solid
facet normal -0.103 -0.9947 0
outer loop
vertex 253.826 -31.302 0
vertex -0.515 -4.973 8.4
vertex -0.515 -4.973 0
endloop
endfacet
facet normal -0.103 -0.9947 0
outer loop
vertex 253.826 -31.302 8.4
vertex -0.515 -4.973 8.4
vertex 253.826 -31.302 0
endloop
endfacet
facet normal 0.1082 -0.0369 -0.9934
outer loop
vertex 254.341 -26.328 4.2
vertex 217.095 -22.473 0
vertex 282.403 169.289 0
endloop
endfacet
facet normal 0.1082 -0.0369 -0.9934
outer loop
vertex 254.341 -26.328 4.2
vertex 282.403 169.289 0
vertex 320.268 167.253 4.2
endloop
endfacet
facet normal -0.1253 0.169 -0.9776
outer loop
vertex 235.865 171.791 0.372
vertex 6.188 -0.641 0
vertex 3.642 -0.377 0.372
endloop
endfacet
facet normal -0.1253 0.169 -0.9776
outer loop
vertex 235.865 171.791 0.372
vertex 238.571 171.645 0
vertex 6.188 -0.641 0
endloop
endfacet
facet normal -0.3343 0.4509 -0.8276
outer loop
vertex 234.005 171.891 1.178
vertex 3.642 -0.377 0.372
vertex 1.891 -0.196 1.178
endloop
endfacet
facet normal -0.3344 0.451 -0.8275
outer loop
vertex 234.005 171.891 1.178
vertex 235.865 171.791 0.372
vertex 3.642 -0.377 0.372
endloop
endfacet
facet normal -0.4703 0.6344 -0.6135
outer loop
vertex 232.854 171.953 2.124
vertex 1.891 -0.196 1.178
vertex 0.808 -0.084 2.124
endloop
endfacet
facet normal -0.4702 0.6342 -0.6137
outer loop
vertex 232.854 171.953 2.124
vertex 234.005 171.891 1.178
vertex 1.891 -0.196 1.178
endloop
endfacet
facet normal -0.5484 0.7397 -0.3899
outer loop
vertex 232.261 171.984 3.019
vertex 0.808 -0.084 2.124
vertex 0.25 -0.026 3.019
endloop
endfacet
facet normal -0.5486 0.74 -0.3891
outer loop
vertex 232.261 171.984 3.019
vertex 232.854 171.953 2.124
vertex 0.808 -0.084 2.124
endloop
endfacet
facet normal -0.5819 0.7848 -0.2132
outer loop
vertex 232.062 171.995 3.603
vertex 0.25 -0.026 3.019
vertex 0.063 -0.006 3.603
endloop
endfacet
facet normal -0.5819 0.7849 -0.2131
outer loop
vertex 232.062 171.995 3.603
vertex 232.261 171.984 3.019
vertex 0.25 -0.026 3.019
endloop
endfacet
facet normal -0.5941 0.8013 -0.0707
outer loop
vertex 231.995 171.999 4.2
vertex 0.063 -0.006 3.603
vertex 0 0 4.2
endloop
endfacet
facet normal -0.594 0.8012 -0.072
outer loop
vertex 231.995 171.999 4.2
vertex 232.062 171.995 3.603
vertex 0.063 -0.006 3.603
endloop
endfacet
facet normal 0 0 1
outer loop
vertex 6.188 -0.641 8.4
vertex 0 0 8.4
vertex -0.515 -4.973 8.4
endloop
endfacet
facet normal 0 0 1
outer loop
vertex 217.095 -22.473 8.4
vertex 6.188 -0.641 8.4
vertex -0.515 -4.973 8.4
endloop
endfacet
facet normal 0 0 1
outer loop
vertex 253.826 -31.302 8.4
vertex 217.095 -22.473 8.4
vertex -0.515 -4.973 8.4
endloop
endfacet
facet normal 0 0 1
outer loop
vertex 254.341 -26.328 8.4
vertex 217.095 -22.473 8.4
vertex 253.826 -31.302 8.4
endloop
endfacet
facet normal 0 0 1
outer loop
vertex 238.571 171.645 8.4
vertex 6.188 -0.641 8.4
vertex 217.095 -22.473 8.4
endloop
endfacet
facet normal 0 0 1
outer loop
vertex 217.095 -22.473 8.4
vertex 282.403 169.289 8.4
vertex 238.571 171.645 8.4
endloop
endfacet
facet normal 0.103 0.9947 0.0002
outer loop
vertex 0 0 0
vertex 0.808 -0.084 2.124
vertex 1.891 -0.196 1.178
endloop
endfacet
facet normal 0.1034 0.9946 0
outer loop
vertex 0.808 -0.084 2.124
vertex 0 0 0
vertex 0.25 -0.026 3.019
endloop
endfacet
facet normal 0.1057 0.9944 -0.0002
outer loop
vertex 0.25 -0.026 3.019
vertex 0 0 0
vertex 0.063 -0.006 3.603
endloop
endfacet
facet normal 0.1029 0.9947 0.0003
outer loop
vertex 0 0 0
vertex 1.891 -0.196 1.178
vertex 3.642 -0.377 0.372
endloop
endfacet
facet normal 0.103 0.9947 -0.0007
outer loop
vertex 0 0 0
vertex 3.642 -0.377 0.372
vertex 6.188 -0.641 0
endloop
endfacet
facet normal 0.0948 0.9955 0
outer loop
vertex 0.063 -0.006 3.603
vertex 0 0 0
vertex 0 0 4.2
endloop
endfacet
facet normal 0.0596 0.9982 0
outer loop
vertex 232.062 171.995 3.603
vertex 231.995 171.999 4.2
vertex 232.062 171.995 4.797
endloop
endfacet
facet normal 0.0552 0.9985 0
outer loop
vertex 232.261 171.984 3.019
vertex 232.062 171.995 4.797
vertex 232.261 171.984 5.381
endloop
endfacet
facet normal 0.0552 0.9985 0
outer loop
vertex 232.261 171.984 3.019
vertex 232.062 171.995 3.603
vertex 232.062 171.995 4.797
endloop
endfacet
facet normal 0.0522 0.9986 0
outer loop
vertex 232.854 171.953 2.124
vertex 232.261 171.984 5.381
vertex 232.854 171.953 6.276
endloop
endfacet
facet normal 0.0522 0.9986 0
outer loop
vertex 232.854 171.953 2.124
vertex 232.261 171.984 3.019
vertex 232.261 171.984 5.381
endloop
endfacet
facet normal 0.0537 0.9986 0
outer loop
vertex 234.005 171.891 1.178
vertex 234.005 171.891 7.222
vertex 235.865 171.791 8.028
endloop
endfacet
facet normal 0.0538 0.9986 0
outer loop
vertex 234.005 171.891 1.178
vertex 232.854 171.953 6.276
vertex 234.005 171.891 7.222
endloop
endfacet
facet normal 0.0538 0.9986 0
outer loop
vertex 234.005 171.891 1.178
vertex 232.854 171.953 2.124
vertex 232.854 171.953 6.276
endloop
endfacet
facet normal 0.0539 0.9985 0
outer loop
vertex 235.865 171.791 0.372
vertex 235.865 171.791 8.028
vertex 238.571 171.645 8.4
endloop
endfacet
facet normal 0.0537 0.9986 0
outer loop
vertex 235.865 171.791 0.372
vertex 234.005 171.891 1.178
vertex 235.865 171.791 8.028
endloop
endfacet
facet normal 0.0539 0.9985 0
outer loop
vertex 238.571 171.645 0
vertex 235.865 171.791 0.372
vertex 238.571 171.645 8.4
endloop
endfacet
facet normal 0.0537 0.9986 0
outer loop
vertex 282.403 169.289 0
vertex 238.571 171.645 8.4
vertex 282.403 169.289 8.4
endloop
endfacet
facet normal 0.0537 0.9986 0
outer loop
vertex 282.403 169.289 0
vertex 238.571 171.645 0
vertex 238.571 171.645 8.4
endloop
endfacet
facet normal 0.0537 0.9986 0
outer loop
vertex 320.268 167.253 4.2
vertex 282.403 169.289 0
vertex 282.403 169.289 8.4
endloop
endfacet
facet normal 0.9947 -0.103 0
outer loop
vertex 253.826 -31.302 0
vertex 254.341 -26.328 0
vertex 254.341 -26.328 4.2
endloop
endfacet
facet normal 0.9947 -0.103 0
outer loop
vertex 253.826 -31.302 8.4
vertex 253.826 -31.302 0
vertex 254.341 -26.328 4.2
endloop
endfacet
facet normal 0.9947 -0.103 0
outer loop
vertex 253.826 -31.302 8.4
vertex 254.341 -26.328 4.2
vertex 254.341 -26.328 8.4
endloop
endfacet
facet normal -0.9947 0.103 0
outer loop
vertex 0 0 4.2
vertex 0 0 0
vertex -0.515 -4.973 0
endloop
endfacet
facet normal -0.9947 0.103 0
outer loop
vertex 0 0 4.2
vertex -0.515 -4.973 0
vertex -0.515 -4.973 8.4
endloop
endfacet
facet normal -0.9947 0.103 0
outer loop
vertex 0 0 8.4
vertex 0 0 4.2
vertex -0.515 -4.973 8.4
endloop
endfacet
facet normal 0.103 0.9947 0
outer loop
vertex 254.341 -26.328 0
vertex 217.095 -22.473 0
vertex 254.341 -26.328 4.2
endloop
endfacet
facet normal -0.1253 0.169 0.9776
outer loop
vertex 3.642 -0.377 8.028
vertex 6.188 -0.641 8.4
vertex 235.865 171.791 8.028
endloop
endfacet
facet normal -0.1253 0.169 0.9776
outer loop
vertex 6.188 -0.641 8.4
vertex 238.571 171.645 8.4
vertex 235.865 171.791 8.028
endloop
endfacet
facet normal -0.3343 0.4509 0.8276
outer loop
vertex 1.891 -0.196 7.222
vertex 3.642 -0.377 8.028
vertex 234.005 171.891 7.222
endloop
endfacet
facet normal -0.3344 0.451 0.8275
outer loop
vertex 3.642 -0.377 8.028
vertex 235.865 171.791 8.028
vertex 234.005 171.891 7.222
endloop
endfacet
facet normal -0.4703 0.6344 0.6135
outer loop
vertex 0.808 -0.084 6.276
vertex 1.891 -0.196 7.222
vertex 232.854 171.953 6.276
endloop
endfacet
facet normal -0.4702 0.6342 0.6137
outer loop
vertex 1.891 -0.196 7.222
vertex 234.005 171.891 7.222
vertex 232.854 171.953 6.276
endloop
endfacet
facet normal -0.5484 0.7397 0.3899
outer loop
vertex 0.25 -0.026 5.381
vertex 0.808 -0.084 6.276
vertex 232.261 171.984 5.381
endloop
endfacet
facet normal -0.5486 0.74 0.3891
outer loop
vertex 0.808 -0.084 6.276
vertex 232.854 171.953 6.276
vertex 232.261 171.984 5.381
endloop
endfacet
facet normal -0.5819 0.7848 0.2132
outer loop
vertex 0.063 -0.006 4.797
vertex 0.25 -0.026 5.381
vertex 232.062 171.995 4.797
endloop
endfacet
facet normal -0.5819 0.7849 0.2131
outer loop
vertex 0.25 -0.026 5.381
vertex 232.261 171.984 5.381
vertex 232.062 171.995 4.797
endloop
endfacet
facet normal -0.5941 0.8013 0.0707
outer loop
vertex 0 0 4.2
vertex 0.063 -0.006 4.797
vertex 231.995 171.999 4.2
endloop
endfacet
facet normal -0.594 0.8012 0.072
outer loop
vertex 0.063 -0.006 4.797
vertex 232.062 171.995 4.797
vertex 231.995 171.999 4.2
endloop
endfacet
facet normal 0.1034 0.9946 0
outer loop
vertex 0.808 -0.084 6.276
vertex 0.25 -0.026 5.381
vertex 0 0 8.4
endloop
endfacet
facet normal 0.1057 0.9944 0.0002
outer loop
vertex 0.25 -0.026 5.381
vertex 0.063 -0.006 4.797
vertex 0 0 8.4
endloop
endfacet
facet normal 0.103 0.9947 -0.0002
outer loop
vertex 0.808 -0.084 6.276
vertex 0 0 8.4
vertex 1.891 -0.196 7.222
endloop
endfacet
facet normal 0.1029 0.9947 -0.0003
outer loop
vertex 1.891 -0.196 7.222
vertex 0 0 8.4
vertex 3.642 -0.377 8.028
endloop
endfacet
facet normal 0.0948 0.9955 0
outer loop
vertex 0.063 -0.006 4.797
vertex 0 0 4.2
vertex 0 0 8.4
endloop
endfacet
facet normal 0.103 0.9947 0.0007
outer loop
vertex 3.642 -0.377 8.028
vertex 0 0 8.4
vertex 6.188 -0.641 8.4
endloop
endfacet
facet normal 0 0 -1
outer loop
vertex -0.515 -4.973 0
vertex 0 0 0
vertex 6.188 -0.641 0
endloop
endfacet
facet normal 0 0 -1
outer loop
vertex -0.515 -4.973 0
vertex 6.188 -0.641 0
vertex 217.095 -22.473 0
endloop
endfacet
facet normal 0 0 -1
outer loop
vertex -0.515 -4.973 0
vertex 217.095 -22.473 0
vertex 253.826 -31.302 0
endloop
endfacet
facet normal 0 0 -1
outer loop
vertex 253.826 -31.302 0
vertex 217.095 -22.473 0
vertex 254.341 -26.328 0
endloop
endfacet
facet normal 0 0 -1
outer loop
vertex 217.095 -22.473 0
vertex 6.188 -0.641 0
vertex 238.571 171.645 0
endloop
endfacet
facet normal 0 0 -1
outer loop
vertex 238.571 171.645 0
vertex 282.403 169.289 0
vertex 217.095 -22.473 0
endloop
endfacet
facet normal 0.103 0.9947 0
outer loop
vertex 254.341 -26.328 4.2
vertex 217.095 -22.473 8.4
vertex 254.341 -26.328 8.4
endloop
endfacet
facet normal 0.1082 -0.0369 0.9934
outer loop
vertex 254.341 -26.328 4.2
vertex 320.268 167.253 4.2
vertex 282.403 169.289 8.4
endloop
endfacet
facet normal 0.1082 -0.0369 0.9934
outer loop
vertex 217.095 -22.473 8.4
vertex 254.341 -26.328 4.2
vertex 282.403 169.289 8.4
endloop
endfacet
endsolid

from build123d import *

# Parameters (mm, degrees)
BOSS_EXTRUDE1_DEPTH = 8.4
CUT_EXTRUDE2_DEPTH  = 362.634640928
CUT_EXTRUDE4_DEPTH  = 362.634640928
FILLET1_R           = 4.2
SKETCH14_W          = 255.7
SKETCH14_H          = 8.4
BOSS_EXTRUDE2_DEPTH = 5


with BuildPart() as part:
    # Sketch1 → Boss-Extrude1 (new body)
    with BuildSketch(Plane.XY):
        Polygon((320.267992754, 167.253247716), (254.340919031, -26.328442922), (0, 0), (231.995455688, 171.998687612), align=None)
    extrude(amount=BOSS_EXTRUDE1_DEPTH)

    # Sketch4 → Cut-Extrude2 (cut, through all)
    with BuildSketch(Plane(origin=(84.32608447, 247.606712606, 0), x_dir=(0, 0, -1), z_dir=(-0.32238177860112127, -0.9466097341703061, 0))):
        Polygon((0, 212.749400009), (-4.2, 249.249400009), (0, 249.249400009), align=None)
    extrude(amount=CUT_EXTRUDE2_DEPTH, mode=Mode.SUBTRACT)

    # Sketch10 → Cut-Extrude4 (cut, through all)
    with BuildSketch(Plane(origin=(84.32608447, 247.606712606, 0), x_dir=(0, 0, -1), z_dir=(-0.32238177860112127, -0.9466097341703061, 0))):
        Polygon((-4.2, 249.249400009), (-8.4, 212.749400009), (-8.4, 249.249400009), align=None)
    extrude(amount=CUT_EXTRUDE4_DEPTH, mode=Mode.SUBTRACT)

    # Fillet1
    fillet1_edges = [part.edges().sort_by_distance(p)[0] for p in [
        (115.997727844, 85.999343806, 0),
        (115.997727844, 85.999343806, 8.4),
    ]]
    fillet(fillet1_edges, radius=FILLET1_R - 0.0001)  # a hair under: the kernel refuses the full size

    # Sketch14 → Boss-Extrude2 (add)
    with BuildSketch(Plane(origin=(0, 0, 0), x_dir=(0.9946848612849409, -0.10296614361312137, 0), z_dir=(-0.10296614361312136, -0.9946848612849408, 0))):
        with Locations((127.85, 4.2)):
            Rectangle(SKETCH14_W, SKETCH14_H)
    extrude(amount=BOSS_EXTRUDE2_DEPTH)


solid = part.part
